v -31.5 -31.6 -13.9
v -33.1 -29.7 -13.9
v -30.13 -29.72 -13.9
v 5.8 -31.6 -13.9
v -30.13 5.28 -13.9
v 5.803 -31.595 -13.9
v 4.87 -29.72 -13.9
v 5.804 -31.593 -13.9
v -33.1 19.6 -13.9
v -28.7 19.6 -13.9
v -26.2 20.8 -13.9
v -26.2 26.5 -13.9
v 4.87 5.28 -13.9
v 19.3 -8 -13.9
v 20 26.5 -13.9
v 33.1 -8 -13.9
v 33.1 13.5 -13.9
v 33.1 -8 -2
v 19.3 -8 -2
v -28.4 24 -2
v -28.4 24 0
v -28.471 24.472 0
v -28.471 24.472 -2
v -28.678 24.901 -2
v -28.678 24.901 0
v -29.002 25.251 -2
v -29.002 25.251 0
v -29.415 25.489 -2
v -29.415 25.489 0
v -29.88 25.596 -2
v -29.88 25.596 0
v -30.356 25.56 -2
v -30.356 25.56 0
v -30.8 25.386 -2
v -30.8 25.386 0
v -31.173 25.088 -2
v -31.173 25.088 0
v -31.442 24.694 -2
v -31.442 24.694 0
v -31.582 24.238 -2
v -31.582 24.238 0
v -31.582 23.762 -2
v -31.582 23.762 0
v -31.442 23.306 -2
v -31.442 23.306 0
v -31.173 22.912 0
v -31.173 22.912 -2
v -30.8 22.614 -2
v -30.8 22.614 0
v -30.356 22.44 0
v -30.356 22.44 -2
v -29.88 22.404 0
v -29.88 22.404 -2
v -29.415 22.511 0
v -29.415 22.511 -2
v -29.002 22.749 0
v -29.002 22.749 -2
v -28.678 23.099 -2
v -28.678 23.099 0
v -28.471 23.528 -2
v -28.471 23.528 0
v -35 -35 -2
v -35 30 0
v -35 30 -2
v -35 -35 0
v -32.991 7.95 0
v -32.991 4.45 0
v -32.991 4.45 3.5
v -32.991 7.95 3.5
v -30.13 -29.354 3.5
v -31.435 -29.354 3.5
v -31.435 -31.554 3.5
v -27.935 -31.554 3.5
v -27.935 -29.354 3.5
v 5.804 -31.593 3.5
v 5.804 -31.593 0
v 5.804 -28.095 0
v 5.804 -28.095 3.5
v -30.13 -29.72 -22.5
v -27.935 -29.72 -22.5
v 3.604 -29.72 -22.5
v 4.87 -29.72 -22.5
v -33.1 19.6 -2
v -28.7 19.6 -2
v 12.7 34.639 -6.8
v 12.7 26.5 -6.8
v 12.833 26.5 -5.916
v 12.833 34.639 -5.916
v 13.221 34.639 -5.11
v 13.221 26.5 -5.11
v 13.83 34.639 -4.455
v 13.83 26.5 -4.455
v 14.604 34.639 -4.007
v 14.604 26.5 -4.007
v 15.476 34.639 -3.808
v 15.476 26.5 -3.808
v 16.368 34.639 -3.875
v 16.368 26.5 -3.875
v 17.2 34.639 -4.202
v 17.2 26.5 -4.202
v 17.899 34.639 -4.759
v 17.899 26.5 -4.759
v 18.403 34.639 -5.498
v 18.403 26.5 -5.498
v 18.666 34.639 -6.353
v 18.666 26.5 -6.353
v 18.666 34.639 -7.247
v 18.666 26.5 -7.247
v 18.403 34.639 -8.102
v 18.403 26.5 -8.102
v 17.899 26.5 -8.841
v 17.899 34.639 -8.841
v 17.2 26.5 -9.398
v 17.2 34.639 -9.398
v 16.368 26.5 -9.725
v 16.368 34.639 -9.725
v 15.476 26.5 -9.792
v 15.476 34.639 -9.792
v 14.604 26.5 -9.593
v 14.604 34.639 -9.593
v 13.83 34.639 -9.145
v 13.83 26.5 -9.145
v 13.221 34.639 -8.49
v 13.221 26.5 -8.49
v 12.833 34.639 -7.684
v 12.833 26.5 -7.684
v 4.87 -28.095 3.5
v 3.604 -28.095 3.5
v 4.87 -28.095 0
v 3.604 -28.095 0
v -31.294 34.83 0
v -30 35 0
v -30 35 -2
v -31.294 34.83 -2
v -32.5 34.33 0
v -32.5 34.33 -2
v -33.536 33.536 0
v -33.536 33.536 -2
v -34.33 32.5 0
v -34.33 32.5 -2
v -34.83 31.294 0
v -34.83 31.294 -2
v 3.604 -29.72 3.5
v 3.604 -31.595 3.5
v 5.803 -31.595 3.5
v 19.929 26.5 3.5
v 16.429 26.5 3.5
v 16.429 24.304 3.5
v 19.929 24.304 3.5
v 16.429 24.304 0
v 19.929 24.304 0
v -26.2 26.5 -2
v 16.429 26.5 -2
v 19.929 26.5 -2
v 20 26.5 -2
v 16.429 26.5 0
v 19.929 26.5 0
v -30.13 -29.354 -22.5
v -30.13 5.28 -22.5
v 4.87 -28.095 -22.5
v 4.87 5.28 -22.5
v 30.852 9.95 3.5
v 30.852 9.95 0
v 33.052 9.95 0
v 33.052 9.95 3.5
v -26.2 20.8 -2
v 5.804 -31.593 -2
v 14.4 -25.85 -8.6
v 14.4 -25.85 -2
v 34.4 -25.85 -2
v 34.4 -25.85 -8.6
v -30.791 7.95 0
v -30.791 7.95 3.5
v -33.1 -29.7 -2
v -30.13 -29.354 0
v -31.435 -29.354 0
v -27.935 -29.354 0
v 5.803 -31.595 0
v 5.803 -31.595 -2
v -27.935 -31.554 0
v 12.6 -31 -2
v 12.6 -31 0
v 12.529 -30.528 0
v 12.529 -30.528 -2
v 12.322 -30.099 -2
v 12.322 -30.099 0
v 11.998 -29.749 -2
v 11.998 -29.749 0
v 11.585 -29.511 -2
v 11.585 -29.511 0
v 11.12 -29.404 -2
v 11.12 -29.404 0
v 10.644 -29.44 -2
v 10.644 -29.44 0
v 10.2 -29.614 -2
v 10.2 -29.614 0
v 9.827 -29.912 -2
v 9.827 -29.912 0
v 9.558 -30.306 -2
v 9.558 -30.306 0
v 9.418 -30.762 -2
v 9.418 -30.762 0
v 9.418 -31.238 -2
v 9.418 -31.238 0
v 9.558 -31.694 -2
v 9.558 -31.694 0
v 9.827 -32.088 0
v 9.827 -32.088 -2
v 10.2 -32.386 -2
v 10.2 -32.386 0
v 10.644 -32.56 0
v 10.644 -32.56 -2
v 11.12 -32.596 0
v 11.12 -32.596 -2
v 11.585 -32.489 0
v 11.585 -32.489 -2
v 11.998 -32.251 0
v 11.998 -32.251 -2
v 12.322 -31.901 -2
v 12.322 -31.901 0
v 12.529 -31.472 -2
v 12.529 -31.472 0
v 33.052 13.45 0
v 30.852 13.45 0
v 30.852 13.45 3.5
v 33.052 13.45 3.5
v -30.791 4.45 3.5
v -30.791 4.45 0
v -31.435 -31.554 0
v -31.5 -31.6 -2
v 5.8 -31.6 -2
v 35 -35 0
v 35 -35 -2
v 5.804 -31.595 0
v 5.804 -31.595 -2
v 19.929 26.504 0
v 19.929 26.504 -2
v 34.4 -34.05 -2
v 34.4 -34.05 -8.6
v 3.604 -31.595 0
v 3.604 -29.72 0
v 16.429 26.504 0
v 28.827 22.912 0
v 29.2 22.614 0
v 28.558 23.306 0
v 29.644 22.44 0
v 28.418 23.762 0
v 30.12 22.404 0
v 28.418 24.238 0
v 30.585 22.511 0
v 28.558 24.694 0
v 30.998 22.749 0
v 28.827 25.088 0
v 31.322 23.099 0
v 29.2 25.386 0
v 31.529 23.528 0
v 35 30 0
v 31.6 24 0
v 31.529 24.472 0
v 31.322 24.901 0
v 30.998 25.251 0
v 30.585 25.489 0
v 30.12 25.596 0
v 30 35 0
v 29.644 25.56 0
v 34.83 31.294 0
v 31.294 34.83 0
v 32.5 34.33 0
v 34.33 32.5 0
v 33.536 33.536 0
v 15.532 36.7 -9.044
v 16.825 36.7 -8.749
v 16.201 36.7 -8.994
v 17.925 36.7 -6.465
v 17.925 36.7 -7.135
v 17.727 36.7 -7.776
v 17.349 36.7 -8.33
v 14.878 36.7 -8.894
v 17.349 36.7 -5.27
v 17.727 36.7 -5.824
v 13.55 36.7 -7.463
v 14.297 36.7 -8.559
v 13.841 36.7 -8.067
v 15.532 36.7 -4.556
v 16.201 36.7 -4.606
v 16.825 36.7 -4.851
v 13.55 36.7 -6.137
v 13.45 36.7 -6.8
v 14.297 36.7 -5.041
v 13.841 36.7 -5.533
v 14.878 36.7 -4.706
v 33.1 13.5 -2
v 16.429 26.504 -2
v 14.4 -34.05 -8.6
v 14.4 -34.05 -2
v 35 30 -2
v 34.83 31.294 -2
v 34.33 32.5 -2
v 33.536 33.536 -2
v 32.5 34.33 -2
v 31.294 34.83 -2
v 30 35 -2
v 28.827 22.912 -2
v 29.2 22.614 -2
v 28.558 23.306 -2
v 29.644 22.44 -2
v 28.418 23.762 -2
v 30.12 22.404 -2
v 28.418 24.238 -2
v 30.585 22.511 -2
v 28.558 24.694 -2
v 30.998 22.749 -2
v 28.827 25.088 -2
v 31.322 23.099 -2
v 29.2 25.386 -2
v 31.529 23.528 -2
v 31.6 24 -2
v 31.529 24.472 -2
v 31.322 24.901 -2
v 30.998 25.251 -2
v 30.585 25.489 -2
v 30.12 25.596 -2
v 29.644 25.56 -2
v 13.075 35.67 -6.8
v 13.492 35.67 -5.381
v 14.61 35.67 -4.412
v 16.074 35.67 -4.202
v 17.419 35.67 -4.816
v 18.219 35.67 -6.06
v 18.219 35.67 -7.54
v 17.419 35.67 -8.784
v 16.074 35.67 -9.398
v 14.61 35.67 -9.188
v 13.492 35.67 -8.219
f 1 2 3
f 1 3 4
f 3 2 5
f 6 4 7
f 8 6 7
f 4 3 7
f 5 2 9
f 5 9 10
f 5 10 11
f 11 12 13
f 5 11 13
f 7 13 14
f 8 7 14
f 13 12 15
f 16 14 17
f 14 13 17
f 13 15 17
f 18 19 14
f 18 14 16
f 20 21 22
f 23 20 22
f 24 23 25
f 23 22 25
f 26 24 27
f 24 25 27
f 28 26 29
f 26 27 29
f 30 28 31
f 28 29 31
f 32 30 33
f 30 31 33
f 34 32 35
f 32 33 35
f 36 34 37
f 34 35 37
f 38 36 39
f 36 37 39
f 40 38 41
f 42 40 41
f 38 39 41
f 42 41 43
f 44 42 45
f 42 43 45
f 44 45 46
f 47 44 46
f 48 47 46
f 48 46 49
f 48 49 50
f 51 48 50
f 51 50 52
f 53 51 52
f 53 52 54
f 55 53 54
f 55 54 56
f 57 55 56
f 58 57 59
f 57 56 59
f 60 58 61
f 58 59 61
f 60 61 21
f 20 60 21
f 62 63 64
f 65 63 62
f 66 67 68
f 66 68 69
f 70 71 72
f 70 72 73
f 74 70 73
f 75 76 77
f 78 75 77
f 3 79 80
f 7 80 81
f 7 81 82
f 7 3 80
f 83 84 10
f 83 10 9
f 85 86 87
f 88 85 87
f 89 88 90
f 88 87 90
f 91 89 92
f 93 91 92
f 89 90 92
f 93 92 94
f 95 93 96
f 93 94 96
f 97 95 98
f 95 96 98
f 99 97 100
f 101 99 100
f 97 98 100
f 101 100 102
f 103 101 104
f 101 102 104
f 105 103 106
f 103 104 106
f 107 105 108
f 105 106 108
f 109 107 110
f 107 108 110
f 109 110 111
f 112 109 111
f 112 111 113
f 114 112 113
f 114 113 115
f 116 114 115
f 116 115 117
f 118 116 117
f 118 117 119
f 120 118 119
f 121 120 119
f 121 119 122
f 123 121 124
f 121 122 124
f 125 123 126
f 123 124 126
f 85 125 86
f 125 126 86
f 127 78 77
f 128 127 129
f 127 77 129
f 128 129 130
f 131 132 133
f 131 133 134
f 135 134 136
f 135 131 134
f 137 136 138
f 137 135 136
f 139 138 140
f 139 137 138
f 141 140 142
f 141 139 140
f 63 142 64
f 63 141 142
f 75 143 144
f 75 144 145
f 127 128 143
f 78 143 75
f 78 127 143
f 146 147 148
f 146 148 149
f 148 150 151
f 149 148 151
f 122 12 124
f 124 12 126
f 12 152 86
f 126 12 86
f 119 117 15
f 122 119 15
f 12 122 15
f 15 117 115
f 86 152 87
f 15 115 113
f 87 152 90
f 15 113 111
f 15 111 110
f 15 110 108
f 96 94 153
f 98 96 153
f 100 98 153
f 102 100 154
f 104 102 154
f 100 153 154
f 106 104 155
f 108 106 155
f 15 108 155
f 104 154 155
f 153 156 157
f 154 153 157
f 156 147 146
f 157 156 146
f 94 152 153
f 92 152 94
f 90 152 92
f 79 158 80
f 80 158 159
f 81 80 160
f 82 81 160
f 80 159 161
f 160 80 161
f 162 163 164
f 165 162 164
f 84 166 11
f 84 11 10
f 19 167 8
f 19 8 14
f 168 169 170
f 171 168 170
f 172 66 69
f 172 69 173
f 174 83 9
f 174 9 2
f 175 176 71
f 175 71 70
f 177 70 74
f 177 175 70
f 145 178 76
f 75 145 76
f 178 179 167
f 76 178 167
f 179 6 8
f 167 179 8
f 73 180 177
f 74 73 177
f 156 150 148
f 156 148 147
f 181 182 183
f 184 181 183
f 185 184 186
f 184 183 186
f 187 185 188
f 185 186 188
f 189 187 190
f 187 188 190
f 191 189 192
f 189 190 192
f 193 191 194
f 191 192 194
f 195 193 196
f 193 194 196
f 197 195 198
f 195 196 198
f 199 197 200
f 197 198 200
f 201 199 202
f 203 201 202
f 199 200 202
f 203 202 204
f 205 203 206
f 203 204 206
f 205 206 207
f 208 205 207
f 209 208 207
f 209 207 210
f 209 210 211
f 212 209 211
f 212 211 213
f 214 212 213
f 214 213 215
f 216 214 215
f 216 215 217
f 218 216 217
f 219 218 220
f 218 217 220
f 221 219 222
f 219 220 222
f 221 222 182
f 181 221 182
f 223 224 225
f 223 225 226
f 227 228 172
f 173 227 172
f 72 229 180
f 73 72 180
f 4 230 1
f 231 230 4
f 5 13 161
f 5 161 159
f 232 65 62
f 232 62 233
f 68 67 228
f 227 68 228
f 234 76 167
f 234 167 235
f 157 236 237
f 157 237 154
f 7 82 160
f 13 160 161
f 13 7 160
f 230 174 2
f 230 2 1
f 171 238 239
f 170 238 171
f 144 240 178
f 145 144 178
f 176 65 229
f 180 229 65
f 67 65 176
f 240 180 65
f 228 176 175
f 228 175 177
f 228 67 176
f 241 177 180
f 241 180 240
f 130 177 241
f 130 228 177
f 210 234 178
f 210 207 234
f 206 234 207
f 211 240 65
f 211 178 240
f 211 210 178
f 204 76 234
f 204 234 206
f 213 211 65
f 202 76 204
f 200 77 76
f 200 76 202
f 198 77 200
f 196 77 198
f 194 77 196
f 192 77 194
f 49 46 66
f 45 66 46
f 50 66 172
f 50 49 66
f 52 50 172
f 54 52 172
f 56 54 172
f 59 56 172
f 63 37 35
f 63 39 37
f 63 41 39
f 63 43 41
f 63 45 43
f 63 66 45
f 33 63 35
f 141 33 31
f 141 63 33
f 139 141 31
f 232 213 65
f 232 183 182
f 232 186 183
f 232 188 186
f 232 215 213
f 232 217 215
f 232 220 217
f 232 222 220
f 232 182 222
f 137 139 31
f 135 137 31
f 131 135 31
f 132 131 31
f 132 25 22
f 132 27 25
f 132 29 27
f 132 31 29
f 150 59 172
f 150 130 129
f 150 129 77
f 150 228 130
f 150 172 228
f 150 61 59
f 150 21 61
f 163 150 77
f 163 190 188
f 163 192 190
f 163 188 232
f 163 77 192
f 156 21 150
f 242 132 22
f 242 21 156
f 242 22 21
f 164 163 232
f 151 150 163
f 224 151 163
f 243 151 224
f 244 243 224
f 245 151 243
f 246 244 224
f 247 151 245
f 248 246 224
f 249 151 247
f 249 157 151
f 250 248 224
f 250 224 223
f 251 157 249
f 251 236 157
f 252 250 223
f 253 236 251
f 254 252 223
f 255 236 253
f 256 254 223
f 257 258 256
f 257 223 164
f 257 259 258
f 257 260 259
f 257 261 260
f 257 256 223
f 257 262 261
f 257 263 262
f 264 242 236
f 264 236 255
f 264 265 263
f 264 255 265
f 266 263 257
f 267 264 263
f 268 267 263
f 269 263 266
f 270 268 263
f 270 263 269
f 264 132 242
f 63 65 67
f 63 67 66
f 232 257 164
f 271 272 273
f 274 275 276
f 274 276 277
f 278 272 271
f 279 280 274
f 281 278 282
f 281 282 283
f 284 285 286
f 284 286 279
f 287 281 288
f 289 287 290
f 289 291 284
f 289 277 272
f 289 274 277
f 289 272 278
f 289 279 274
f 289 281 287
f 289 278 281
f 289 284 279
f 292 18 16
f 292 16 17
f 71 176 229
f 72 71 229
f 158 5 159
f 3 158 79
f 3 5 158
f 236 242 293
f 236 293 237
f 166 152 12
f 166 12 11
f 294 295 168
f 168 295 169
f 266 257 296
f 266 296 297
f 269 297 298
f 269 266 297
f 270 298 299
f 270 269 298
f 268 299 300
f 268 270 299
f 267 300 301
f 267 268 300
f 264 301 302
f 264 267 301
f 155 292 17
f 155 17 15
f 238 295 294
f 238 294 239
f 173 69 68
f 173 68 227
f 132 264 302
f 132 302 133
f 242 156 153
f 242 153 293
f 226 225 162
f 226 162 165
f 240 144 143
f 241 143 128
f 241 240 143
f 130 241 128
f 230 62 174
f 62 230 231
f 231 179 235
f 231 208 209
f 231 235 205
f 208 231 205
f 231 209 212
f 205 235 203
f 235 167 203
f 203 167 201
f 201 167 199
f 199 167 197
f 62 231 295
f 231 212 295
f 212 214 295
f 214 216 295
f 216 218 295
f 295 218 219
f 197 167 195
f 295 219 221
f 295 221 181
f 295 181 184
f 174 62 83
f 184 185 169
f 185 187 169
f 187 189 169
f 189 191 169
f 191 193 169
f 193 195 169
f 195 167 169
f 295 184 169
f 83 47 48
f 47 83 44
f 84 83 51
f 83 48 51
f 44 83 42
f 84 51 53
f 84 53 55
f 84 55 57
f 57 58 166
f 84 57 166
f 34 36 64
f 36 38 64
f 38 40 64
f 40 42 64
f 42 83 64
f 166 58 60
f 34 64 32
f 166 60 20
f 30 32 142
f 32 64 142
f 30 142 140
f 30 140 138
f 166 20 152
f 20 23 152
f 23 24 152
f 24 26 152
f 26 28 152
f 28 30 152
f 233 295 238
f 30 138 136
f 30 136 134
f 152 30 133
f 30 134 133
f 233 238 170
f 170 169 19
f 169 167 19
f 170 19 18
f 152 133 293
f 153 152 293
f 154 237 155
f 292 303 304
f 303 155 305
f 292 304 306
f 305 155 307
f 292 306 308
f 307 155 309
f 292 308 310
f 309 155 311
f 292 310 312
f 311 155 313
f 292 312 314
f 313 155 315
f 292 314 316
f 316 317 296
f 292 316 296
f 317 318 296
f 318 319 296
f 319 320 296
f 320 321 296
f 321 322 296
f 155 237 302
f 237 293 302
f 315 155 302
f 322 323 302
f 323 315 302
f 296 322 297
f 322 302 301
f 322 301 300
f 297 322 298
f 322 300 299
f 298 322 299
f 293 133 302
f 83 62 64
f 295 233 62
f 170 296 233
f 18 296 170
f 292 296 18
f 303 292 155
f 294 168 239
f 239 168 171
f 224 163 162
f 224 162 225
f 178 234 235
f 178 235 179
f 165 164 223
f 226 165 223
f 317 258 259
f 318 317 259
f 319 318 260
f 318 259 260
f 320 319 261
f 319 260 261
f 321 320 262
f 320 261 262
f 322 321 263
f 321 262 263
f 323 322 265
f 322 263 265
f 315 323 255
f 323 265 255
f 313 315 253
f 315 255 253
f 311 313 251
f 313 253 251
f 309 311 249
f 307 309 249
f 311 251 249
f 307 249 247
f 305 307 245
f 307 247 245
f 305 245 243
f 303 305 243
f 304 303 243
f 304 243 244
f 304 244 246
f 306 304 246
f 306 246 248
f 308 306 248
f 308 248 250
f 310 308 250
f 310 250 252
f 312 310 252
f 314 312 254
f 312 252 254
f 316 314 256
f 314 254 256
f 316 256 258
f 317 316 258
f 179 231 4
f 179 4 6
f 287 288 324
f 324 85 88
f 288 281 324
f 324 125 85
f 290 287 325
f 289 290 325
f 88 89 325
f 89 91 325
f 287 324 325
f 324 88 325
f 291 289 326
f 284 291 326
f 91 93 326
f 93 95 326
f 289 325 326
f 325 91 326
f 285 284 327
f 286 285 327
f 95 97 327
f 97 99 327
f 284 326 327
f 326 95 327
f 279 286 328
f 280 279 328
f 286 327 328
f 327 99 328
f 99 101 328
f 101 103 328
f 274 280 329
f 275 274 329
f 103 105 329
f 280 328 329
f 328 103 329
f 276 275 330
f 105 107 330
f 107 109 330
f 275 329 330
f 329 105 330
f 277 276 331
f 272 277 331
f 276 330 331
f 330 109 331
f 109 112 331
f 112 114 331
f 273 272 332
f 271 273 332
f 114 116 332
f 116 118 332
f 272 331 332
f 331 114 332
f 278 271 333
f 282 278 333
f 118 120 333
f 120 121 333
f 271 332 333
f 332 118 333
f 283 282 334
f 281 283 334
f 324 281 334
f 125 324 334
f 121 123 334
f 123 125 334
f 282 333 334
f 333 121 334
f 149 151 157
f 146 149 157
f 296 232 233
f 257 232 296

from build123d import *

# Parameters (mm, degrees)
F0_R     = 1.6
F0_W     = 20
F0_H     = 8.2
F0_W_2   = 2.2
F0_H_2   = 3.5
F0_W_3   = 3.5
F0_H_3   = 2.1957031846
F1_DEPTH = 2
F0_W_4   = 1.2657215719
F0_H_4   = 1.6254235071
F0_W_5   = 2.1951658177
F0_H_5   = 0.3664782417
F2_DEPTH = 13.9
F3_DEPTH = 8.6
F4_DEPTH = 22.5
F5_R     = 3
F6_DEPTH = 10.2
F7_SIZE2 = 2.0606080646
F7_SIZE  = 0.75
F8_DEPTH = 3.5


with BuildPart() as f1:
    # F0 (on Top) → F1 (new body)
    with BuildSketch(Plane.XY):
        with BuildLine():
            ThreePointArc((35, 30), (33.5355339059, 33.5355339059), (30, 35))
            Line((30, 35), (-30, 35))
            ThreePointArc((-30, 35), (-33.5355339059, 33.5355339059), (-35, 30))
            Line((-35, 30), (-35, -35))
            Line((-35, -35), (35, -35))
            Line((35, -35), (35, 30))
        make_face()
        with Locations((11, -31)):
            Circle(F0_R, mode=Mode.SUBTRACT)
        with Locations((24.4, -29.95)):
            Rectangle(F0_W, F0_H, mode=Mode.SUBTRACT)
        Polygon((-26.2, 20.8), (-26.2, 26.5), (16.4288448244, 26.5), (16.4288448244, 26.5042968154), (19.9288448244, 26.5042968154), (19.9288448244, 26.5), (20, 26.5), (33.1, 13.5), (33.1, -8), (19.3, -8), (5.8042784281, -31.5925206738), (5.8042784281, -31.5945764929), (5.8031024299, -31.5945764929), (5.8, -31.6), (-31.5, -31.6), (-33.1, -29.7), (-33.1, 19.6), (-28.7, 19.6), align=None, mode=Mode.SUBTRACT)
        with Locations((-30, 24)):
            Circle(F0_R, mode=Mode.SUBTRACT)
        with Locations((30, 24)):
            Circle(F0_R, mode=Mode.SUBTRACT)
        Polygon((16.4288448244, 26.5), (-26.2, 26.5), (-26.2, 20.8), (-28.7, 19.6), (-33.1, 19.6), (-33.1, -29.7), (-31.5, -31.6), (5.8, -31.6), (5.8031024299, -31.5945764929), (3.6042784281, -31.5945764929), (3.6042784281, -29.72), (-27.9348341823, -29.72), (-27.9348341823, -31.5535217583), (-31.4348341823, -31.5535217583), (-31.4348341823, -29.3535217583), (-30.13, -29.3535217583), (-30.13, 5.28), (4.87, 5.28), (4.87, -28.0945764929), (5.8042784281, -28.0945764929), (5.8042784281, -31.5925206738), (19.3, -8), (33.1, -8), (33.1, 13.5), (20, 26.5), (19.9288448244, 26.5), (19.9288448244, 24.3042968154), (16.4288448244, 24.3042968154), align=None)
        with Locations((-31.891271472, 6.2)):
            Rectangle(F0_W_2, F0_H_2, mode=Mode.SUBTRACT)
        with Locations((31.9520607591, 11.7002176121)):
            Rectangle(F0_W_2, F0_H_2, mode=Mode.SUBTRACT)
        Polygon((3.6042784281, -28.0945764929), (4.87, -28.0945764929), (4.87, 5.28), (-30.13, 5.28), (-30.13, -29.3535217583), (-27.9348341823, -29.3535217583), (-27.9348341823, -29.72), (3.6042784281, -29.72), align=None)
        with Locations((24.4, -29.95)):
            Rectangle(F0_W, F0_H)
        with Locations((31.9520607591, 11.7002176121)):
            Rectangle(F0_W_2, F0_H_2)
        with Locations((18.1788448244, 25.4021484077)):
            Rectangle(F0_W_3, F0_H_3)
        Polygon((5.8031024299, -31.5945764929), (5.8042784281, -31.5925206738), (5.8042784281, -28.0945764929), (4.87, -28.0945764929), (4.87, -29.72), (3.6042784281, -29.72), (3.6042784281, -31.5945764929), align=None)
        Polygon((-27.9348341823, -31.5535217583), (-27.9348341823, -29.72), (-30.13, -29.72), (-30.13, -29.3535217583), (-31.4348341823, -29.3535217583), (-31.4348341823, -31.5535217583), align=None)
        with Locations((-31.891271472, 6.2)):
            Rectangle(F0_W_2, F0_H_2)
    extrude(amount=-F1_DEPTH)

    # F0 (on Top) → F2 (join)
    with BuildSketch(Plane.XY):
        Polygon((16.4288448244, 26.5), (-26.2, 26.5), (-26.2, 20.8), (-28.7, 19.6), (-33.1, 19.6), (-33.1, -29.7), (-31.5, -31.6), (5.8, -31.6), (5.8031024299, -31.5945764929), (3.6042784281, -31.5945764929), (3.6042784281, -29.72), (-27.9348341823, -29.72), (-27.9348341823, -31.5535217583), (-31.4348341823, -31.5535217583), (-31.4348341823, -29.3535217583), (-30.13, -29.3535217583), (-30.13, 5.28), (4.87, 5.28), (4.87, -28.0945764929), (5.8042784281, -28.0945764929), (5.8042784281, -31.5925206738), (19.3, -8), (33.1, -8), (33.1, 13.5), (20, 26.5), (19.9288448244, 26.5), (19.9288448244, 24.3042968154), (16.4288448244, 24.3042968154), align=None)
        with Locations((-31.891271472, 6.2)):
            Rectangle(F0_W_2, F0_H_2, mode=Mode.SUBTRACT)
        with Locations((31.9520607591, 11.7002176121)):
            Rectangle(F0_W_2, F0_H_2, mode=Mode.SUBTRACT)
        Polygon((3.6042784281, -28.0945764929), (4.87, -28.0945764929), (4.87, 5.28), (-30.13, 5.28), (-30.13, -29.3535217583), (-27.9348341823, -29.3535217583), (-27.9348341823, -29.72), (3.6042784281, -29.72), align=None)
        Polygon((5.8031024299, -31.5945764929), (5.8042784281, -31.5925206738), (5.8042784281, -28.0945764929), (4.87, -28.0945764929), (4.87, -29.72), (3.6042784281, -29.72), (3.6042784281, -31.5945764929), align=None)
        with Locations((-31.891271472, 6.2)):
            Rectangle(F0_W_2, F0_H_2)
        with Locations((18.1788448244, 25.4021484077)):
            Rectangle(F0_W_3, F0_H_3)
        with Locations((31.9520607591, 11.7002176121)):
            Rectangle(F0_W_2, F0_H_2)
        with Locations((4.2371392141, -28.9072882465)):
            Rectangle(F0_W_4, F0_H_4)
        Polygon((-27.9348341823, -31.5535217583), (-27.9348341823, -29.72), (-30.13, -29.72), (-30.13, -29.3535217583), (-31.4348341823, -29.3535217583), (-31.4348341823, -31.5535217583), align=None)
        with Locations((-29.0324170911, -29.5367608792)):
            Rectangle(F0_W_5, F0_H_5)
    extrude(amount=-F2_DEPTH)

    # F0 (on Top) → F3 (join)
    with BuildSketch(Plane.XY):
        with Locations((24.4, -29.95)):
            Rectangle(F0_W, F0_H)
    extrude(amount=-F3_DEPTH)

    # F0 (on Top) → F4 (join)
    with BuildSketch(Plane.XY):
        Polygon((3.6042784281, -28.0945764929), (4.87, -28.0945764929), (4.87, 5.28), (-30.13, 5.28), (-30.13, -29.3535217583), (-27.9348341823, -29.3535217583), (-27.9348341823, -29.72), (3.6042784281, -29.72), align=None)
        with Locations((4.2371392141, -28.9072882465)):
            Rectangle(F0_W_4, F0_H_4)
        with Locations((-29.0324170911, -29.5367608792)):
            Rectangle(F0_W_5, F0_H_5)
    extrude(amount=-F4_DEPTH)

    # F5 (on face) → F6 (join)
    with BuildSketch(Plane(origin=(0, 26.5, 0), x_dir=(-1, 0, 0), z_dir=(0, 1, 0))):
        with Locations((-15.7, -6.8)):
            Circle(F5_R)
    extrude(amount=F6_DEPTH)

    # F7
    f7_edges = [f1.edges().sort_by_distance(p)[0] for p in [
        (18.7, 36.7, -6.8),
    ]]
    f7_side = f1.faces().sort_by_distance((15.7, 36.7, -6.8))[0]
    chamfer(f7_edges, length=F7_SIZE, length2=F7_SIZE2, reference=f7_side)

    # F0 (on Top) → F8 (join)
    with BuildSketch(Plane.XY):
        Polygon((-27.9348341823, -31.5535217583), (-27.9348341823, -29.72), (-30.13, -29.72), (-30.13, -29.3535217583), (-31.4348341823, -29.3535217583), (-31.4348341823, -31.5535217583), align=None)
        Polygon((5.8031024299, -31.5945764929), (5.8042784281, -31.5925206738), (5.8042784281, -28.0945764929), (4.87, -28.0945764929), (4.87, -29.72), (3.6042784281, -29.72), (3.6042784281, -31.5945764929), align=None)
        with Locations((4.2371392141, -28.9072882465)):
            Rectangle(F0_W_4, F0_H_4)
        with Locations((-29.0324170911, -29.5367608792)):
            Rectangle(F0_W_5, F0_H_5)
        with Locations((-31.891271472, 6.2)):
            Rectangle(F0_W_2, F0_H_2)
        with Locations((18.1788448244, 25.4021484077)):
            Rectangle(F0_W_3, F0_H_3)
        with Locations((31.9520607591, 11.7002176121)):
            Rectangle(F0_W_2, F0_H_2)
    extrude(amount=F8_DEPTH)


solid = f1.part
